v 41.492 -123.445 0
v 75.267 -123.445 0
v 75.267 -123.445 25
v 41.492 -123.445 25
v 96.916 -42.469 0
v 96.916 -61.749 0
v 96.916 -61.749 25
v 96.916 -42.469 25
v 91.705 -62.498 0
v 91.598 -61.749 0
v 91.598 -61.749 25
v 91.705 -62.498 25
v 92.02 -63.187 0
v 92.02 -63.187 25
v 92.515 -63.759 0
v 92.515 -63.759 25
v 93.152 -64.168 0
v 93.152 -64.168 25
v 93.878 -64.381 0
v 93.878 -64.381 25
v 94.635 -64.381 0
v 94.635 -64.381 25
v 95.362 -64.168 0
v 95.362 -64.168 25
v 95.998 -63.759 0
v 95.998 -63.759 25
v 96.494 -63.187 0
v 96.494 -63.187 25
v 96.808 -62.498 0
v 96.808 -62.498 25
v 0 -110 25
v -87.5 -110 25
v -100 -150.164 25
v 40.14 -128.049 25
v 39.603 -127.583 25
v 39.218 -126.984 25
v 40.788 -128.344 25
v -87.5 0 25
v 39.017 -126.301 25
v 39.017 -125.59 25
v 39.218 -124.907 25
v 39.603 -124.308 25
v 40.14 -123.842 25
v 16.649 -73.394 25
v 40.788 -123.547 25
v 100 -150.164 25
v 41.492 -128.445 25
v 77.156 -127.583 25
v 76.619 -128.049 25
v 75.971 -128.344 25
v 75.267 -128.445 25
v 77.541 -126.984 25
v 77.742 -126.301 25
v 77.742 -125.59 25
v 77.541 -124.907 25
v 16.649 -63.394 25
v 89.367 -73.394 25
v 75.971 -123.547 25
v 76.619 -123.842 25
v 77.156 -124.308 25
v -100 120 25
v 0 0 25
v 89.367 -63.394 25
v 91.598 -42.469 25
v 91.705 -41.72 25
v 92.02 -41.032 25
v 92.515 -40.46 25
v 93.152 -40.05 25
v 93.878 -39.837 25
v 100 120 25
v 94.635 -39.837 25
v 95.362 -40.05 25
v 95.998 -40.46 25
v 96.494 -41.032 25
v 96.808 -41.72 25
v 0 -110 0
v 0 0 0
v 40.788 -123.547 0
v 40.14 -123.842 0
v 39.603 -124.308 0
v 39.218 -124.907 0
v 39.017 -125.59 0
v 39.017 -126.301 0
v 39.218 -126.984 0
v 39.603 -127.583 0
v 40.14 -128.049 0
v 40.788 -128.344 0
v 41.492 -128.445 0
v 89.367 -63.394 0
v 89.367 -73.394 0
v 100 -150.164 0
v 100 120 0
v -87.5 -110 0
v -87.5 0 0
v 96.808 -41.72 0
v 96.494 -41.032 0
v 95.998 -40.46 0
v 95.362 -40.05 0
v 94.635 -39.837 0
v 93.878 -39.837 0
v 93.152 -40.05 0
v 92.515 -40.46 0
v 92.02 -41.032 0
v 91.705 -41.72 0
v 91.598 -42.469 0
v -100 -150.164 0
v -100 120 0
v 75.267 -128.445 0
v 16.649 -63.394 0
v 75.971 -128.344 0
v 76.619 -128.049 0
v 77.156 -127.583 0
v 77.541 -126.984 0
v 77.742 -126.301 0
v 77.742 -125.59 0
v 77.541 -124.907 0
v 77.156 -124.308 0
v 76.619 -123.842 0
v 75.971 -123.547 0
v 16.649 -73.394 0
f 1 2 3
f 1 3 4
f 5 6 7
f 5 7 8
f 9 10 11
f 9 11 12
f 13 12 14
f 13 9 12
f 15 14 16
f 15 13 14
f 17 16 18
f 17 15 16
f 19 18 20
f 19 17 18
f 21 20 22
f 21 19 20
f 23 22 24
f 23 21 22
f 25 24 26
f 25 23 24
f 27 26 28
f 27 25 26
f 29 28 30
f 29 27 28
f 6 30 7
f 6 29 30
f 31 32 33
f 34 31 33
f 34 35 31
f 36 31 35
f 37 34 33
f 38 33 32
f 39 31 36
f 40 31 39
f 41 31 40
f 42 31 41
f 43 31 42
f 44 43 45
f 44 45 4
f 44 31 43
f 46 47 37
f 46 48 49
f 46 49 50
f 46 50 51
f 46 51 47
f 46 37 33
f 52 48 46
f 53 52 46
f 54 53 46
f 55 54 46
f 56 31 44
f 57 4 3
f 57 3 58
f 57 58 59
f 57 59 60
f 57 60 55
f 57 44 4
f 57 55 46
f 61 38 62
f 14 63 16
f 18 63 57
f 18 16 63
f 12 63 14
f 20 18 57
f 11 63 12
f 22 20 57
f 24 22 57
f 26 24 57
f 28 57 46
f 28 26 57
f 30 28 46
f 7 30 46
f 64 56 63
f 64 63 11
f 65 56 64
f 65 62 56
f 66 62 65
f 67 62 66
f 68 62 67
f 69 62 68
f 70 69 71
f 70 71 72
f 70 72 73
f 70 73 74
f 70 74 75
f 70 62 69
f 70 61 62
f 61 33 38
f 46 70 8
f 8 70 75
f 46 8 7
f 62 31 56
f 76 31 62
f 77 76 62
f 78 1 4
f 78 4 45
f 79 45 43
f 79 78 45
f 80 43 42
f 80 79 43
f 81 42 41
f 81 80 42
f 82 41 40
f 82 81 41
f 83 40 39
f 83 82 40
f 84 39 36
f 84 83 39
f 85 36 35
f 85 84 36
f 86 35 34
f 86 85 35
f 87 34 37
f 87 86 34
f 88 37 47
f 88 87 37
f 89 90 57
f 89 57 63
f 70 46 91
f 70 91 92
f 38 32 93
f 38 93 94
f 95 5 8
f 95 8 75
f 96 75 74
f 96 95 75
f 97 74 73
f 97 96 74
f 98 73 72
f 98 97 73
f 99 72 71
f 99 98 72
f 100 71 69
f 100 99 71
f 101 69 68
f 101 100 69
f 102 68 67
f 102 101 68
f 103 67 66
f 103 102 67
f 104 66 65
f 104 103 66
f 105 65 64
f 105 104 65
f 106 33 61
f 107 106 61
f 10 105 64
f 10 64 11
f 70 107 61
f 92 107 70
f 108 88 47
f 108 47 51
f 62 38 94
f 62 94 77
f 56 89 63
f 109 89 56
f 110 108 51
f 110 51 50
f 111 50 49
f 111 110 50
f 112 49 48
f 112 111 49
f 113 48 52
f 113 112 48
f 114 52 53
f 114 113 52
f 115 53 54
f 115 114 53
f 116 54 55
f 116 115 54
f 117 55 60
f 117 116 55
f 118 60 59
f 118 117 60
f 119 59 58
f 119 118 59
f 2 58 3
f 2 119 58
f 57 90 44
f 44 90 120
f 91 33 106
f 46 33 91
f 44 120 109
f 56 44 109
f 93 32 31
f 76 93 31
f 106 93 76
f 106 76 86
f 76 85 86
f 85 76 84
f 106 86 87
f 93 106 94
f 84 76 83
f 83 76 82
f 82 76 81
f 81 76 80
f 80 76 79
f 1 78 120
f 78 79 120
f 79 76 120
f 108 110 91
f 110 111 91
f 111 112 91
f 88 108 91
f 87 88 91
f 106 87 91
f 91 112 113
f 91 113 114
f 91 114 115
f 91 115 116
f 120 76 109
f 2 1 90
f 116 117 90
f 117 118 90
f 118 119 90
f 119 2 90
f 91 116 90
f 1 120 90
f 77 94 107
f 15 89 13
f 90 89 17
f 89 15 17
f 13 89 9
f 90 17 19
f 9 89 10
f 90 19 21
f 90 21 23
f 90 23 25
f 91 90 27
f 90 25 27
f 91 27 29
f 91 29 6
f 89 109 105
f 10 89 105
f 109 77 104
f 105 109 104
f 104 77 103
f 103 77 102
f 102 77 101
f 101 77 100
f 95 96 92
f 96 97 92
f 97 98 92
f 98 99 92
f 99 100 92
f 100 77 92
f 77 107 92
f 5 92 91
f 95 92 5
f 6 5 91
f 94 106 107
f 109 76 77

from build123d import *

# Parameters (mm, degrees)
SKETCH1_W           = 200
SKETCH1_H           = 240
BOSS_EXTRUDE3_DEPTH = 25
SKETCH3_W           = 87.5
SKETCH3_H           = 110
CUT_EXTRUDE1_DEPTH  = 25
SKETCH4_W           = 200
SKETCH4_H           = 30.164162566
BOSS_EXTRUDE4_DEPTH = 25
CUT_EXTRUDE3_DEPTH  = 40
CUT_EXTRUDE4_DEPTH  = 40
SKETCH8_W           = 72.718372575
SKETCH8_H           = 10
CUT_EXTRUDE5_DEPTH  = 40


with BuildPart() as part:
    # Sketch1 → Boss-Extrude3 (new body)
    with BuildSketch(Plane.XY):
        Rectangle(SKETCH1_W, SKETCH1_H)
    extrude(amount=BOSS_EXTRUDE3_DEPTH)

    # Sketch3 → Cut-Extrude1 (cut)
    with BuildSketch(Plane.XY.offset(25)):
        with Locations((-43.75, -55)):
            Rectangle(SKETCH3_W, SKETCH3_H)
    extrude(amount=-CUT_EXTRUDE1_DEPTH, mode=Mode.SUBTRACT)

    # Sketch4 → Boss-Extrude4 (add)
    with BuildSketch(Plane.XY.offset(25)):
        with Locations((0, -135.082081283)):
            Rectangle(SKETCH4_W, SKETCH4_H)
    extrude(amount=-BOSS_EXTRUDE4_DEPTH)

    # Sketch9 → Cut-Extrude3 (cut)
    with BuildSketch(Plane(origin=(0, 0, 0), x_dir=(-1, 0, 0), z_dir=(0, 0, -1))):
        with BuildLine():
            Line((-91.597538887, -42.469319431), (-91.597538887, -61.749189722))
            ThreePointArc((-91.597538887, -61.749189722), (-94.256831341, -64.408482175), (-96.916123795, -61.749189722))
            Line((-96.916123795, -61.749189722), (-96.916123795, -42.469319431))
            ThreePointArc((-96.916123795, -42.469319431), (-94.256831341, -39.810026977), (-91.597538887, -42.469319431))
        make_face()
    extrude(amount=-CUT_EXTRUDE3_DEPTH, mode=Mode.SUBTRACT)

    # Sketch10 → Cut-Extrude4 (cut)
    with BuildSketch(Plane(origin=(0, 0, 0), x_dir=(-1, 0, 0), z_dir=(0, 0, -1))):
        with BuildLine():
            Line((-75.267088852, -123.445469049), (-41.491938711, -123.445469049))
            ThreePointArc((-41.491938711, -123.445469049), (-38.991938711, -125.945469049), (-41.491938711, -128.445469049))
            Line((-41.491938711, -128.445469049), (-75.267088852, -128.445469049))
            ThreePointArc((-75.267088852, -128.445469049), (-77.767088852, -125.945469049), (-75.267088852, -123.445469049))
        make_face()
    extrude(amount=-CUT_EXTRUDE4_DEPTH, mode=Mode.SUBTRACT)

    # Sketch8 → Cut-Extrude5 (cut)
    with BuildSketch(Plane(origin=(0, 0, 0), x_dir=(-1, 0, 0), z_dir=(0, 0, -1))):
        with Locations((-53.00826824, -68.393983819)):
            Rectangle(SKETCH8_W, SKETCH8_H)
    extrude(amount=-CUT_EXTRUDE5_DEPTH, mode=Mode.SUBTRACT)


solid = part.part
